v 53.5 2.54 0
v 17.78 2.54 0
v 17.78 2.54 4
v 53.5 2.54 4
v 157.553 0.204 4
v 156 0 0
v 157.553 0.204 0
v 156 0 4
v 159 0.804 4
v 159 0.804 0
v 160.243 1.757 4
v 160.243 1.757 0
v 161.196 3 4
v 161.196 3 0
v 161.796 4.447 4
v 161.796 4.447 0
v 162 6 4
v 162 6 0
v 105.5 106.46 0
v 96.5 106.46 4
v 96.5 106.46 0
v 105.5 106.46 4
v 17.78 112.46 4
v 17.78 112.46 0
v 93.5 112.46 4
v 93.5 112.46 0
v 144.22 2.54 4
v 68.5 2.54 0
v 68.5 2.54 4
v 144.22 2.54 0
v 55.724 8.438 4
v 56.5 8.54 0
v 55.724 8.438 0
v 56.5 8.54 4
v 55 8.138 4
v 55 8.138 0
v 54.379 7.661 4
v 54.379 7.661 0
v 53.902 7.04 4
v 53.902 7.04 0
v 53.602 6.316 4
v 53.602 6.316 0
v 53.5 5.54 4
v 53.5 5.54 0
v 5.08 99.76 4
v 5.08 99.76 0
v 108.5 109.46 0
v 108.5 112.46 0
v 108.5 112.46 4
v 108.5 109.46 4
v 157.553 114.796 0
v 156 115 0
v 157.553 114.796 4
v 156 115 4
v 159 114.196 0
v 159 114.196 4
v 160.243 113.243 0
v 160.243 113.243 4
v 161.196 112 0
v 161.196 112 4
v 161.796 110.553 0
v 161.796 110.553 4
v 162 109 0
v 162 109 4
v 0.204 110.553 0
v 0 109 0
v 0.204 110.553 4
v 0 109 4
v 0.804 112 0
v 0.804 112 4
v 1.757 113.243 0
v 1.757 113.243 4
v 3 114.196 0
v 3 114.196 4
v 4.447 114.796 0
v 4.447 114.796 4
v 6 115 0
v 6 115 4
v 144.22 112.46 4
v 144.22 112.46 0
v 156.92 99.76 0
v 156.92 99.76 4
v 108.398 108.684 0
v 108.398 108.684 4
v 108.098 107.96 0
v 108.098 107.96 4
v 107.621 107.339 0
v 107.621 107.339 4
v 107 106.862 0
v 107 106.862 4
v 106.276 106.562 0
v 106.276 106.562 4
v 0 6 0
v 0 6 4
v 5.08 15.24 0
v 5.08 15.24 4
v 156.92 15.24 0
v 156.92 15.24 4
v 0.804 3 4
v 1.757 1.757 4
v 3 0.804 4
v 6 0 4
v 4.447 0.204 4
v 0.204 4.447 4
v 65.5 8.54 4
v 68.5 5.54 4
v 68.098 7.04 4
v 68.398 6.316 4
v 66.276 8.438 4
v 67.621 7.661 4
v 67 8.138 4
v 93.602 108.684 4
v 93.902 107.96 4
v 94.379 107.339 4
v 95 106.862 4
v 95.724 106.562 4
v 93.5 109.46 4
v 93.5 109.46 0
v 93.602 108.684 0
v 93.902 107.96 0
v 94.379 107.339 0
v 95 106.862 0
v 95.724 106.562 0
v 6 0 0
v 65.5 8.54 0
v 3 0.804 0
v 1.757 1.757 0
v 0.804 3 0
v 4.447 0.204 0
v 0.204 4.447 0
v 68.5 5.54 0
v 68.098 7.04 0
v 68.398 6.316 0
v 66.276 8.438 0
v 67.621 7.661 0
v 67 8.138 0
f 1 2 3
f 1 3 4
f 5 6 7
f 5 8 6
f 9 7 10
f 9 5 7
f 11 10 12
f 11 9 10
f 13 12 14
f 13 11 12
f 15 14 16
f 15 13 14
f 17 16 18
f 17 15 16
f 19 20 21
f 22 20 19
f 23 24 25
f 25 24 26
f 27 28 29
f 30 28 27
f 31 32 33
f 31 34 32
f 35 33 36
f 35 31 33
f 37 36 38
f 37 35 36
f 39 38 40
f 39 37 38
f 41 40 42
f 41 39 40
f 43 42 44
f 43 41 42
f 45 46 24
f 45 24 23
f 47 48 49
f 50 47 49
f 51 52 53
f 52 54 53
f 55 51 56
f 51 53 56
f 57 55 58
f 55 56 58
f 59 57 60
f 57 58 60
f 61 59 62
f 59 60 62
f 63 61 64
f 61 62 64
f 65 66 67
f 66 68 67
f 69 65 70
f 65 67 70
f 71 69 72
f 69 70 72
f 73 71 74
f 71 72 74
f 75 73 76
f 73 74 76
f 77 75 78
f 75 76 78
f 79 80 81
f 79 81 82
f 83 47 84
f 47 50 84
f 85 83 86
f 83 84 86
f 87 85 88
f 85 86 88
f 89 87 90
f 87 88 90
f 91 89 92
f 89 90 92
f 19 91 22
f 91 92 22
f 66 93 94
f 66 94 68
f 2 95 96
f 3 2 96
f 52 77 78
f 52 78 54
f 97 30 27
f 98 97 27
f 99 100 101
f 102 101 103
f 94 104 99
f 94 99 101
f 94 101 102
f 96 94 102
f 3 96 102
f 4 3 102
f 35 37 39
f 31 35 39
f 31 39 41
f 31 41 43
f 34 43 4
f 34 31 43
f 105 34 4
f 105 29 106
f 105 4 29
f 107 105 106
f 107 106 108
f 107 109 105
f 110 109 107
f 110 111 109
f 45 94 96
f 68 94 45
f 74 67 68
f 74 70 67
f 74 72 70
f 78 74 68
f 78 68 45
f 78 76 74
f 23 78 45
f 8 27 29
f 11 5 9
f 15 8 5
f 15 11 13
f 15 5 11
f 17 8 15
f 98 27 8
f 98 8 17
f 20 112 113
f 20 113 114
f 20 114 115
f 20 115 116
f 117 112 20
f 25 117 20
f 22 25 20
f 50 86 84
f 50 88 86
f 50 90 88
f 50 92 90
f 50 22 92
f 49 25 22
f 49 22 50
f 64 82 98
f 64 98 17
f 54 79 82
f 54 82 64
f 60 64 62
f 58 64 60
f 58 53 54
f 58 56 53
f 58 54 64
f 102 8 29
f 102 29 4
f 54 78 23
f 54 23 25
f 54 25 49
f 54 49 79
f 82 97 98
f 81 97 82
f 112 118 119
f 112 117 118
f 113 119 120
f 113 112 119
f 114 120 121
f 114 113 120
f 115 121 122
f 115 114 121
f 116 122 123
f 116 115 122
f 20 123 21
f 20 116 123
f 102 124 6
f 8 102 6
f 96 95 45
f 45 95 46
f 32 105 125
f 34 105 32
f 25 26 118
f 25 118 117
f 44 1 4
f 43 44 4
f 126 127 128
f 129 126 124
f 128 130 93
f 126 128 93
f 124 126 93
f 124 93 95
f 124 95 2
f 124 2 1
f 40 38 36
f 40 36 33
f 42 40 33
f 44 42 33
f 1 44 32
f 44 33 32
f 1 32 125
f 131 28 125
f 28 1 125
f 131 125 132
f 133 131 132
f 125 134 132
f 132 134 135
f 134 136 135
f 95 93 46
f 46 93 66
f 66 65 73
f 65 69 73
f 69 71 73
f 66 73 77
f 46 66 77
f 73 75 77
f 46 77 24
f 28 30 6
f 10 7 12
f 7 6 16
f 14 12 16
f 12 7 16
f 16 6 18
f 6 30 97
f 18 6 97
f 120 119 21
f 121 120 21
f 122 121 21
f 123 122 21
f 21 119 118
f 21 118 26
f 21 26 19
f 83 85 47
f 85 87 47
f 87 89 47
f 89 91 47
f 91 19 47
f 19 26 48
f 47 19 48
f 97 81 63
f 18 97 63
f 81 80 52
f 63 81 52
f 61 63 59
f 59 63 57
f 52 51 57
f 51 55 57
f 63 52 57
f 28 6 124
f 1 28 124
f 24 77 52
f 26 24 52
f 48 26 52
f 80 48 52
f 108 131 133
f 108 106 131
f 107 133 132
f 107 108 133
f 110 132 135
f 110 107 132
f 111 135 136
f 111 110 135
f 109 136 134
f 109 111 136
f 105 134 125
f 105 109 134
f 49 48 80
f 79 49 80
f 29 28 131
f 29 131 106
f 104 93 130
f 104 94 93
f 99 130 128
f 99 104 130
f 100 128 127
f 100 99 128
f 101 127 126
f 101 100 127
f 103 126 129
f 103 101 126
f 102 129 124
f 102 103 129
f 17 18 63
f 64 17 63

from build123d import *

# Parameters (mm, degrees)
F0_W     = 162
F0_H     = 115
F0_W_2   = 151.84
F0_H_2   = 109.92
F1_DEPTH = 4
F2_R     = 6
F3_SIZE  = 12.7
F4_W     = 15
F4_H     = 4
F5_DEPTH = 6
F6_W     = 15
F6_H     = 4
F7_DEPTH = 6
F8_R     = 3


with BuildPart() as f1:
    # F0 (on Top) → F1 (new body)
    with BuildSketch(Plane.XY):
        with Locations((81, 57.5)):
            Rectangle(F0_W, F0_H)
        with Locations((81, 57.5)):
            Rectangle(F0_W_2, F0_H_2, mode=Mode.SUBTRACT)
    extrude(amount=F1_DEPTH)

    # F2
    f2_edges = [f1.edges().sort_by_distance(p)[0] for p in [
        (0, 115, 2),
        (162, 115, 2),
        (162, 0, 2),
        (0, 0, 2),
    ]]
    fillet(f2_edges, radius=F2_R)

    # F3
    f3_edges = [f1.edges().sort_by_distance(p)[0] for p in [
        (5.08, 112.46, 2),
        (156.92, 2.54, 2),
        (156.92, 112.46, 2),
        (5.08, 2.54, 2),
    ]]
    chamfer(f3_edges, length=F3_SIZE)

    # F4 (on face) → F5 (join)
    with BuildSketch(Plane(origin=(0, 2.54, 0), x_dir=(-1, 0, 0), z_dir=(0, 1, 0))):
        with Locations((-61, 2)):
            Rectangle(F4_W, F4_H)
    extrude(amount=F5_DEPTH)

    # F6 (on face) → F7 (join)
    with BuildSketch(Plane.XZ.offset(-112.46)):
        with Locations((101, 2)):
            Rectangle(F6_W, F6_H)
    extrude(amount=F7_DEPTH)

    # F8
    f8_edges = [f1.edges().sort_by_distance(p)[0] for p in [
        (93.5, 106.46, 2),
        (108.5, 106.46, 2),
        (68.5, 8.54, 2),
        (53.5, 8.54, 2),
    ]]
    fillet(f8_edges, radius=F8_R)


solid = f1.part
